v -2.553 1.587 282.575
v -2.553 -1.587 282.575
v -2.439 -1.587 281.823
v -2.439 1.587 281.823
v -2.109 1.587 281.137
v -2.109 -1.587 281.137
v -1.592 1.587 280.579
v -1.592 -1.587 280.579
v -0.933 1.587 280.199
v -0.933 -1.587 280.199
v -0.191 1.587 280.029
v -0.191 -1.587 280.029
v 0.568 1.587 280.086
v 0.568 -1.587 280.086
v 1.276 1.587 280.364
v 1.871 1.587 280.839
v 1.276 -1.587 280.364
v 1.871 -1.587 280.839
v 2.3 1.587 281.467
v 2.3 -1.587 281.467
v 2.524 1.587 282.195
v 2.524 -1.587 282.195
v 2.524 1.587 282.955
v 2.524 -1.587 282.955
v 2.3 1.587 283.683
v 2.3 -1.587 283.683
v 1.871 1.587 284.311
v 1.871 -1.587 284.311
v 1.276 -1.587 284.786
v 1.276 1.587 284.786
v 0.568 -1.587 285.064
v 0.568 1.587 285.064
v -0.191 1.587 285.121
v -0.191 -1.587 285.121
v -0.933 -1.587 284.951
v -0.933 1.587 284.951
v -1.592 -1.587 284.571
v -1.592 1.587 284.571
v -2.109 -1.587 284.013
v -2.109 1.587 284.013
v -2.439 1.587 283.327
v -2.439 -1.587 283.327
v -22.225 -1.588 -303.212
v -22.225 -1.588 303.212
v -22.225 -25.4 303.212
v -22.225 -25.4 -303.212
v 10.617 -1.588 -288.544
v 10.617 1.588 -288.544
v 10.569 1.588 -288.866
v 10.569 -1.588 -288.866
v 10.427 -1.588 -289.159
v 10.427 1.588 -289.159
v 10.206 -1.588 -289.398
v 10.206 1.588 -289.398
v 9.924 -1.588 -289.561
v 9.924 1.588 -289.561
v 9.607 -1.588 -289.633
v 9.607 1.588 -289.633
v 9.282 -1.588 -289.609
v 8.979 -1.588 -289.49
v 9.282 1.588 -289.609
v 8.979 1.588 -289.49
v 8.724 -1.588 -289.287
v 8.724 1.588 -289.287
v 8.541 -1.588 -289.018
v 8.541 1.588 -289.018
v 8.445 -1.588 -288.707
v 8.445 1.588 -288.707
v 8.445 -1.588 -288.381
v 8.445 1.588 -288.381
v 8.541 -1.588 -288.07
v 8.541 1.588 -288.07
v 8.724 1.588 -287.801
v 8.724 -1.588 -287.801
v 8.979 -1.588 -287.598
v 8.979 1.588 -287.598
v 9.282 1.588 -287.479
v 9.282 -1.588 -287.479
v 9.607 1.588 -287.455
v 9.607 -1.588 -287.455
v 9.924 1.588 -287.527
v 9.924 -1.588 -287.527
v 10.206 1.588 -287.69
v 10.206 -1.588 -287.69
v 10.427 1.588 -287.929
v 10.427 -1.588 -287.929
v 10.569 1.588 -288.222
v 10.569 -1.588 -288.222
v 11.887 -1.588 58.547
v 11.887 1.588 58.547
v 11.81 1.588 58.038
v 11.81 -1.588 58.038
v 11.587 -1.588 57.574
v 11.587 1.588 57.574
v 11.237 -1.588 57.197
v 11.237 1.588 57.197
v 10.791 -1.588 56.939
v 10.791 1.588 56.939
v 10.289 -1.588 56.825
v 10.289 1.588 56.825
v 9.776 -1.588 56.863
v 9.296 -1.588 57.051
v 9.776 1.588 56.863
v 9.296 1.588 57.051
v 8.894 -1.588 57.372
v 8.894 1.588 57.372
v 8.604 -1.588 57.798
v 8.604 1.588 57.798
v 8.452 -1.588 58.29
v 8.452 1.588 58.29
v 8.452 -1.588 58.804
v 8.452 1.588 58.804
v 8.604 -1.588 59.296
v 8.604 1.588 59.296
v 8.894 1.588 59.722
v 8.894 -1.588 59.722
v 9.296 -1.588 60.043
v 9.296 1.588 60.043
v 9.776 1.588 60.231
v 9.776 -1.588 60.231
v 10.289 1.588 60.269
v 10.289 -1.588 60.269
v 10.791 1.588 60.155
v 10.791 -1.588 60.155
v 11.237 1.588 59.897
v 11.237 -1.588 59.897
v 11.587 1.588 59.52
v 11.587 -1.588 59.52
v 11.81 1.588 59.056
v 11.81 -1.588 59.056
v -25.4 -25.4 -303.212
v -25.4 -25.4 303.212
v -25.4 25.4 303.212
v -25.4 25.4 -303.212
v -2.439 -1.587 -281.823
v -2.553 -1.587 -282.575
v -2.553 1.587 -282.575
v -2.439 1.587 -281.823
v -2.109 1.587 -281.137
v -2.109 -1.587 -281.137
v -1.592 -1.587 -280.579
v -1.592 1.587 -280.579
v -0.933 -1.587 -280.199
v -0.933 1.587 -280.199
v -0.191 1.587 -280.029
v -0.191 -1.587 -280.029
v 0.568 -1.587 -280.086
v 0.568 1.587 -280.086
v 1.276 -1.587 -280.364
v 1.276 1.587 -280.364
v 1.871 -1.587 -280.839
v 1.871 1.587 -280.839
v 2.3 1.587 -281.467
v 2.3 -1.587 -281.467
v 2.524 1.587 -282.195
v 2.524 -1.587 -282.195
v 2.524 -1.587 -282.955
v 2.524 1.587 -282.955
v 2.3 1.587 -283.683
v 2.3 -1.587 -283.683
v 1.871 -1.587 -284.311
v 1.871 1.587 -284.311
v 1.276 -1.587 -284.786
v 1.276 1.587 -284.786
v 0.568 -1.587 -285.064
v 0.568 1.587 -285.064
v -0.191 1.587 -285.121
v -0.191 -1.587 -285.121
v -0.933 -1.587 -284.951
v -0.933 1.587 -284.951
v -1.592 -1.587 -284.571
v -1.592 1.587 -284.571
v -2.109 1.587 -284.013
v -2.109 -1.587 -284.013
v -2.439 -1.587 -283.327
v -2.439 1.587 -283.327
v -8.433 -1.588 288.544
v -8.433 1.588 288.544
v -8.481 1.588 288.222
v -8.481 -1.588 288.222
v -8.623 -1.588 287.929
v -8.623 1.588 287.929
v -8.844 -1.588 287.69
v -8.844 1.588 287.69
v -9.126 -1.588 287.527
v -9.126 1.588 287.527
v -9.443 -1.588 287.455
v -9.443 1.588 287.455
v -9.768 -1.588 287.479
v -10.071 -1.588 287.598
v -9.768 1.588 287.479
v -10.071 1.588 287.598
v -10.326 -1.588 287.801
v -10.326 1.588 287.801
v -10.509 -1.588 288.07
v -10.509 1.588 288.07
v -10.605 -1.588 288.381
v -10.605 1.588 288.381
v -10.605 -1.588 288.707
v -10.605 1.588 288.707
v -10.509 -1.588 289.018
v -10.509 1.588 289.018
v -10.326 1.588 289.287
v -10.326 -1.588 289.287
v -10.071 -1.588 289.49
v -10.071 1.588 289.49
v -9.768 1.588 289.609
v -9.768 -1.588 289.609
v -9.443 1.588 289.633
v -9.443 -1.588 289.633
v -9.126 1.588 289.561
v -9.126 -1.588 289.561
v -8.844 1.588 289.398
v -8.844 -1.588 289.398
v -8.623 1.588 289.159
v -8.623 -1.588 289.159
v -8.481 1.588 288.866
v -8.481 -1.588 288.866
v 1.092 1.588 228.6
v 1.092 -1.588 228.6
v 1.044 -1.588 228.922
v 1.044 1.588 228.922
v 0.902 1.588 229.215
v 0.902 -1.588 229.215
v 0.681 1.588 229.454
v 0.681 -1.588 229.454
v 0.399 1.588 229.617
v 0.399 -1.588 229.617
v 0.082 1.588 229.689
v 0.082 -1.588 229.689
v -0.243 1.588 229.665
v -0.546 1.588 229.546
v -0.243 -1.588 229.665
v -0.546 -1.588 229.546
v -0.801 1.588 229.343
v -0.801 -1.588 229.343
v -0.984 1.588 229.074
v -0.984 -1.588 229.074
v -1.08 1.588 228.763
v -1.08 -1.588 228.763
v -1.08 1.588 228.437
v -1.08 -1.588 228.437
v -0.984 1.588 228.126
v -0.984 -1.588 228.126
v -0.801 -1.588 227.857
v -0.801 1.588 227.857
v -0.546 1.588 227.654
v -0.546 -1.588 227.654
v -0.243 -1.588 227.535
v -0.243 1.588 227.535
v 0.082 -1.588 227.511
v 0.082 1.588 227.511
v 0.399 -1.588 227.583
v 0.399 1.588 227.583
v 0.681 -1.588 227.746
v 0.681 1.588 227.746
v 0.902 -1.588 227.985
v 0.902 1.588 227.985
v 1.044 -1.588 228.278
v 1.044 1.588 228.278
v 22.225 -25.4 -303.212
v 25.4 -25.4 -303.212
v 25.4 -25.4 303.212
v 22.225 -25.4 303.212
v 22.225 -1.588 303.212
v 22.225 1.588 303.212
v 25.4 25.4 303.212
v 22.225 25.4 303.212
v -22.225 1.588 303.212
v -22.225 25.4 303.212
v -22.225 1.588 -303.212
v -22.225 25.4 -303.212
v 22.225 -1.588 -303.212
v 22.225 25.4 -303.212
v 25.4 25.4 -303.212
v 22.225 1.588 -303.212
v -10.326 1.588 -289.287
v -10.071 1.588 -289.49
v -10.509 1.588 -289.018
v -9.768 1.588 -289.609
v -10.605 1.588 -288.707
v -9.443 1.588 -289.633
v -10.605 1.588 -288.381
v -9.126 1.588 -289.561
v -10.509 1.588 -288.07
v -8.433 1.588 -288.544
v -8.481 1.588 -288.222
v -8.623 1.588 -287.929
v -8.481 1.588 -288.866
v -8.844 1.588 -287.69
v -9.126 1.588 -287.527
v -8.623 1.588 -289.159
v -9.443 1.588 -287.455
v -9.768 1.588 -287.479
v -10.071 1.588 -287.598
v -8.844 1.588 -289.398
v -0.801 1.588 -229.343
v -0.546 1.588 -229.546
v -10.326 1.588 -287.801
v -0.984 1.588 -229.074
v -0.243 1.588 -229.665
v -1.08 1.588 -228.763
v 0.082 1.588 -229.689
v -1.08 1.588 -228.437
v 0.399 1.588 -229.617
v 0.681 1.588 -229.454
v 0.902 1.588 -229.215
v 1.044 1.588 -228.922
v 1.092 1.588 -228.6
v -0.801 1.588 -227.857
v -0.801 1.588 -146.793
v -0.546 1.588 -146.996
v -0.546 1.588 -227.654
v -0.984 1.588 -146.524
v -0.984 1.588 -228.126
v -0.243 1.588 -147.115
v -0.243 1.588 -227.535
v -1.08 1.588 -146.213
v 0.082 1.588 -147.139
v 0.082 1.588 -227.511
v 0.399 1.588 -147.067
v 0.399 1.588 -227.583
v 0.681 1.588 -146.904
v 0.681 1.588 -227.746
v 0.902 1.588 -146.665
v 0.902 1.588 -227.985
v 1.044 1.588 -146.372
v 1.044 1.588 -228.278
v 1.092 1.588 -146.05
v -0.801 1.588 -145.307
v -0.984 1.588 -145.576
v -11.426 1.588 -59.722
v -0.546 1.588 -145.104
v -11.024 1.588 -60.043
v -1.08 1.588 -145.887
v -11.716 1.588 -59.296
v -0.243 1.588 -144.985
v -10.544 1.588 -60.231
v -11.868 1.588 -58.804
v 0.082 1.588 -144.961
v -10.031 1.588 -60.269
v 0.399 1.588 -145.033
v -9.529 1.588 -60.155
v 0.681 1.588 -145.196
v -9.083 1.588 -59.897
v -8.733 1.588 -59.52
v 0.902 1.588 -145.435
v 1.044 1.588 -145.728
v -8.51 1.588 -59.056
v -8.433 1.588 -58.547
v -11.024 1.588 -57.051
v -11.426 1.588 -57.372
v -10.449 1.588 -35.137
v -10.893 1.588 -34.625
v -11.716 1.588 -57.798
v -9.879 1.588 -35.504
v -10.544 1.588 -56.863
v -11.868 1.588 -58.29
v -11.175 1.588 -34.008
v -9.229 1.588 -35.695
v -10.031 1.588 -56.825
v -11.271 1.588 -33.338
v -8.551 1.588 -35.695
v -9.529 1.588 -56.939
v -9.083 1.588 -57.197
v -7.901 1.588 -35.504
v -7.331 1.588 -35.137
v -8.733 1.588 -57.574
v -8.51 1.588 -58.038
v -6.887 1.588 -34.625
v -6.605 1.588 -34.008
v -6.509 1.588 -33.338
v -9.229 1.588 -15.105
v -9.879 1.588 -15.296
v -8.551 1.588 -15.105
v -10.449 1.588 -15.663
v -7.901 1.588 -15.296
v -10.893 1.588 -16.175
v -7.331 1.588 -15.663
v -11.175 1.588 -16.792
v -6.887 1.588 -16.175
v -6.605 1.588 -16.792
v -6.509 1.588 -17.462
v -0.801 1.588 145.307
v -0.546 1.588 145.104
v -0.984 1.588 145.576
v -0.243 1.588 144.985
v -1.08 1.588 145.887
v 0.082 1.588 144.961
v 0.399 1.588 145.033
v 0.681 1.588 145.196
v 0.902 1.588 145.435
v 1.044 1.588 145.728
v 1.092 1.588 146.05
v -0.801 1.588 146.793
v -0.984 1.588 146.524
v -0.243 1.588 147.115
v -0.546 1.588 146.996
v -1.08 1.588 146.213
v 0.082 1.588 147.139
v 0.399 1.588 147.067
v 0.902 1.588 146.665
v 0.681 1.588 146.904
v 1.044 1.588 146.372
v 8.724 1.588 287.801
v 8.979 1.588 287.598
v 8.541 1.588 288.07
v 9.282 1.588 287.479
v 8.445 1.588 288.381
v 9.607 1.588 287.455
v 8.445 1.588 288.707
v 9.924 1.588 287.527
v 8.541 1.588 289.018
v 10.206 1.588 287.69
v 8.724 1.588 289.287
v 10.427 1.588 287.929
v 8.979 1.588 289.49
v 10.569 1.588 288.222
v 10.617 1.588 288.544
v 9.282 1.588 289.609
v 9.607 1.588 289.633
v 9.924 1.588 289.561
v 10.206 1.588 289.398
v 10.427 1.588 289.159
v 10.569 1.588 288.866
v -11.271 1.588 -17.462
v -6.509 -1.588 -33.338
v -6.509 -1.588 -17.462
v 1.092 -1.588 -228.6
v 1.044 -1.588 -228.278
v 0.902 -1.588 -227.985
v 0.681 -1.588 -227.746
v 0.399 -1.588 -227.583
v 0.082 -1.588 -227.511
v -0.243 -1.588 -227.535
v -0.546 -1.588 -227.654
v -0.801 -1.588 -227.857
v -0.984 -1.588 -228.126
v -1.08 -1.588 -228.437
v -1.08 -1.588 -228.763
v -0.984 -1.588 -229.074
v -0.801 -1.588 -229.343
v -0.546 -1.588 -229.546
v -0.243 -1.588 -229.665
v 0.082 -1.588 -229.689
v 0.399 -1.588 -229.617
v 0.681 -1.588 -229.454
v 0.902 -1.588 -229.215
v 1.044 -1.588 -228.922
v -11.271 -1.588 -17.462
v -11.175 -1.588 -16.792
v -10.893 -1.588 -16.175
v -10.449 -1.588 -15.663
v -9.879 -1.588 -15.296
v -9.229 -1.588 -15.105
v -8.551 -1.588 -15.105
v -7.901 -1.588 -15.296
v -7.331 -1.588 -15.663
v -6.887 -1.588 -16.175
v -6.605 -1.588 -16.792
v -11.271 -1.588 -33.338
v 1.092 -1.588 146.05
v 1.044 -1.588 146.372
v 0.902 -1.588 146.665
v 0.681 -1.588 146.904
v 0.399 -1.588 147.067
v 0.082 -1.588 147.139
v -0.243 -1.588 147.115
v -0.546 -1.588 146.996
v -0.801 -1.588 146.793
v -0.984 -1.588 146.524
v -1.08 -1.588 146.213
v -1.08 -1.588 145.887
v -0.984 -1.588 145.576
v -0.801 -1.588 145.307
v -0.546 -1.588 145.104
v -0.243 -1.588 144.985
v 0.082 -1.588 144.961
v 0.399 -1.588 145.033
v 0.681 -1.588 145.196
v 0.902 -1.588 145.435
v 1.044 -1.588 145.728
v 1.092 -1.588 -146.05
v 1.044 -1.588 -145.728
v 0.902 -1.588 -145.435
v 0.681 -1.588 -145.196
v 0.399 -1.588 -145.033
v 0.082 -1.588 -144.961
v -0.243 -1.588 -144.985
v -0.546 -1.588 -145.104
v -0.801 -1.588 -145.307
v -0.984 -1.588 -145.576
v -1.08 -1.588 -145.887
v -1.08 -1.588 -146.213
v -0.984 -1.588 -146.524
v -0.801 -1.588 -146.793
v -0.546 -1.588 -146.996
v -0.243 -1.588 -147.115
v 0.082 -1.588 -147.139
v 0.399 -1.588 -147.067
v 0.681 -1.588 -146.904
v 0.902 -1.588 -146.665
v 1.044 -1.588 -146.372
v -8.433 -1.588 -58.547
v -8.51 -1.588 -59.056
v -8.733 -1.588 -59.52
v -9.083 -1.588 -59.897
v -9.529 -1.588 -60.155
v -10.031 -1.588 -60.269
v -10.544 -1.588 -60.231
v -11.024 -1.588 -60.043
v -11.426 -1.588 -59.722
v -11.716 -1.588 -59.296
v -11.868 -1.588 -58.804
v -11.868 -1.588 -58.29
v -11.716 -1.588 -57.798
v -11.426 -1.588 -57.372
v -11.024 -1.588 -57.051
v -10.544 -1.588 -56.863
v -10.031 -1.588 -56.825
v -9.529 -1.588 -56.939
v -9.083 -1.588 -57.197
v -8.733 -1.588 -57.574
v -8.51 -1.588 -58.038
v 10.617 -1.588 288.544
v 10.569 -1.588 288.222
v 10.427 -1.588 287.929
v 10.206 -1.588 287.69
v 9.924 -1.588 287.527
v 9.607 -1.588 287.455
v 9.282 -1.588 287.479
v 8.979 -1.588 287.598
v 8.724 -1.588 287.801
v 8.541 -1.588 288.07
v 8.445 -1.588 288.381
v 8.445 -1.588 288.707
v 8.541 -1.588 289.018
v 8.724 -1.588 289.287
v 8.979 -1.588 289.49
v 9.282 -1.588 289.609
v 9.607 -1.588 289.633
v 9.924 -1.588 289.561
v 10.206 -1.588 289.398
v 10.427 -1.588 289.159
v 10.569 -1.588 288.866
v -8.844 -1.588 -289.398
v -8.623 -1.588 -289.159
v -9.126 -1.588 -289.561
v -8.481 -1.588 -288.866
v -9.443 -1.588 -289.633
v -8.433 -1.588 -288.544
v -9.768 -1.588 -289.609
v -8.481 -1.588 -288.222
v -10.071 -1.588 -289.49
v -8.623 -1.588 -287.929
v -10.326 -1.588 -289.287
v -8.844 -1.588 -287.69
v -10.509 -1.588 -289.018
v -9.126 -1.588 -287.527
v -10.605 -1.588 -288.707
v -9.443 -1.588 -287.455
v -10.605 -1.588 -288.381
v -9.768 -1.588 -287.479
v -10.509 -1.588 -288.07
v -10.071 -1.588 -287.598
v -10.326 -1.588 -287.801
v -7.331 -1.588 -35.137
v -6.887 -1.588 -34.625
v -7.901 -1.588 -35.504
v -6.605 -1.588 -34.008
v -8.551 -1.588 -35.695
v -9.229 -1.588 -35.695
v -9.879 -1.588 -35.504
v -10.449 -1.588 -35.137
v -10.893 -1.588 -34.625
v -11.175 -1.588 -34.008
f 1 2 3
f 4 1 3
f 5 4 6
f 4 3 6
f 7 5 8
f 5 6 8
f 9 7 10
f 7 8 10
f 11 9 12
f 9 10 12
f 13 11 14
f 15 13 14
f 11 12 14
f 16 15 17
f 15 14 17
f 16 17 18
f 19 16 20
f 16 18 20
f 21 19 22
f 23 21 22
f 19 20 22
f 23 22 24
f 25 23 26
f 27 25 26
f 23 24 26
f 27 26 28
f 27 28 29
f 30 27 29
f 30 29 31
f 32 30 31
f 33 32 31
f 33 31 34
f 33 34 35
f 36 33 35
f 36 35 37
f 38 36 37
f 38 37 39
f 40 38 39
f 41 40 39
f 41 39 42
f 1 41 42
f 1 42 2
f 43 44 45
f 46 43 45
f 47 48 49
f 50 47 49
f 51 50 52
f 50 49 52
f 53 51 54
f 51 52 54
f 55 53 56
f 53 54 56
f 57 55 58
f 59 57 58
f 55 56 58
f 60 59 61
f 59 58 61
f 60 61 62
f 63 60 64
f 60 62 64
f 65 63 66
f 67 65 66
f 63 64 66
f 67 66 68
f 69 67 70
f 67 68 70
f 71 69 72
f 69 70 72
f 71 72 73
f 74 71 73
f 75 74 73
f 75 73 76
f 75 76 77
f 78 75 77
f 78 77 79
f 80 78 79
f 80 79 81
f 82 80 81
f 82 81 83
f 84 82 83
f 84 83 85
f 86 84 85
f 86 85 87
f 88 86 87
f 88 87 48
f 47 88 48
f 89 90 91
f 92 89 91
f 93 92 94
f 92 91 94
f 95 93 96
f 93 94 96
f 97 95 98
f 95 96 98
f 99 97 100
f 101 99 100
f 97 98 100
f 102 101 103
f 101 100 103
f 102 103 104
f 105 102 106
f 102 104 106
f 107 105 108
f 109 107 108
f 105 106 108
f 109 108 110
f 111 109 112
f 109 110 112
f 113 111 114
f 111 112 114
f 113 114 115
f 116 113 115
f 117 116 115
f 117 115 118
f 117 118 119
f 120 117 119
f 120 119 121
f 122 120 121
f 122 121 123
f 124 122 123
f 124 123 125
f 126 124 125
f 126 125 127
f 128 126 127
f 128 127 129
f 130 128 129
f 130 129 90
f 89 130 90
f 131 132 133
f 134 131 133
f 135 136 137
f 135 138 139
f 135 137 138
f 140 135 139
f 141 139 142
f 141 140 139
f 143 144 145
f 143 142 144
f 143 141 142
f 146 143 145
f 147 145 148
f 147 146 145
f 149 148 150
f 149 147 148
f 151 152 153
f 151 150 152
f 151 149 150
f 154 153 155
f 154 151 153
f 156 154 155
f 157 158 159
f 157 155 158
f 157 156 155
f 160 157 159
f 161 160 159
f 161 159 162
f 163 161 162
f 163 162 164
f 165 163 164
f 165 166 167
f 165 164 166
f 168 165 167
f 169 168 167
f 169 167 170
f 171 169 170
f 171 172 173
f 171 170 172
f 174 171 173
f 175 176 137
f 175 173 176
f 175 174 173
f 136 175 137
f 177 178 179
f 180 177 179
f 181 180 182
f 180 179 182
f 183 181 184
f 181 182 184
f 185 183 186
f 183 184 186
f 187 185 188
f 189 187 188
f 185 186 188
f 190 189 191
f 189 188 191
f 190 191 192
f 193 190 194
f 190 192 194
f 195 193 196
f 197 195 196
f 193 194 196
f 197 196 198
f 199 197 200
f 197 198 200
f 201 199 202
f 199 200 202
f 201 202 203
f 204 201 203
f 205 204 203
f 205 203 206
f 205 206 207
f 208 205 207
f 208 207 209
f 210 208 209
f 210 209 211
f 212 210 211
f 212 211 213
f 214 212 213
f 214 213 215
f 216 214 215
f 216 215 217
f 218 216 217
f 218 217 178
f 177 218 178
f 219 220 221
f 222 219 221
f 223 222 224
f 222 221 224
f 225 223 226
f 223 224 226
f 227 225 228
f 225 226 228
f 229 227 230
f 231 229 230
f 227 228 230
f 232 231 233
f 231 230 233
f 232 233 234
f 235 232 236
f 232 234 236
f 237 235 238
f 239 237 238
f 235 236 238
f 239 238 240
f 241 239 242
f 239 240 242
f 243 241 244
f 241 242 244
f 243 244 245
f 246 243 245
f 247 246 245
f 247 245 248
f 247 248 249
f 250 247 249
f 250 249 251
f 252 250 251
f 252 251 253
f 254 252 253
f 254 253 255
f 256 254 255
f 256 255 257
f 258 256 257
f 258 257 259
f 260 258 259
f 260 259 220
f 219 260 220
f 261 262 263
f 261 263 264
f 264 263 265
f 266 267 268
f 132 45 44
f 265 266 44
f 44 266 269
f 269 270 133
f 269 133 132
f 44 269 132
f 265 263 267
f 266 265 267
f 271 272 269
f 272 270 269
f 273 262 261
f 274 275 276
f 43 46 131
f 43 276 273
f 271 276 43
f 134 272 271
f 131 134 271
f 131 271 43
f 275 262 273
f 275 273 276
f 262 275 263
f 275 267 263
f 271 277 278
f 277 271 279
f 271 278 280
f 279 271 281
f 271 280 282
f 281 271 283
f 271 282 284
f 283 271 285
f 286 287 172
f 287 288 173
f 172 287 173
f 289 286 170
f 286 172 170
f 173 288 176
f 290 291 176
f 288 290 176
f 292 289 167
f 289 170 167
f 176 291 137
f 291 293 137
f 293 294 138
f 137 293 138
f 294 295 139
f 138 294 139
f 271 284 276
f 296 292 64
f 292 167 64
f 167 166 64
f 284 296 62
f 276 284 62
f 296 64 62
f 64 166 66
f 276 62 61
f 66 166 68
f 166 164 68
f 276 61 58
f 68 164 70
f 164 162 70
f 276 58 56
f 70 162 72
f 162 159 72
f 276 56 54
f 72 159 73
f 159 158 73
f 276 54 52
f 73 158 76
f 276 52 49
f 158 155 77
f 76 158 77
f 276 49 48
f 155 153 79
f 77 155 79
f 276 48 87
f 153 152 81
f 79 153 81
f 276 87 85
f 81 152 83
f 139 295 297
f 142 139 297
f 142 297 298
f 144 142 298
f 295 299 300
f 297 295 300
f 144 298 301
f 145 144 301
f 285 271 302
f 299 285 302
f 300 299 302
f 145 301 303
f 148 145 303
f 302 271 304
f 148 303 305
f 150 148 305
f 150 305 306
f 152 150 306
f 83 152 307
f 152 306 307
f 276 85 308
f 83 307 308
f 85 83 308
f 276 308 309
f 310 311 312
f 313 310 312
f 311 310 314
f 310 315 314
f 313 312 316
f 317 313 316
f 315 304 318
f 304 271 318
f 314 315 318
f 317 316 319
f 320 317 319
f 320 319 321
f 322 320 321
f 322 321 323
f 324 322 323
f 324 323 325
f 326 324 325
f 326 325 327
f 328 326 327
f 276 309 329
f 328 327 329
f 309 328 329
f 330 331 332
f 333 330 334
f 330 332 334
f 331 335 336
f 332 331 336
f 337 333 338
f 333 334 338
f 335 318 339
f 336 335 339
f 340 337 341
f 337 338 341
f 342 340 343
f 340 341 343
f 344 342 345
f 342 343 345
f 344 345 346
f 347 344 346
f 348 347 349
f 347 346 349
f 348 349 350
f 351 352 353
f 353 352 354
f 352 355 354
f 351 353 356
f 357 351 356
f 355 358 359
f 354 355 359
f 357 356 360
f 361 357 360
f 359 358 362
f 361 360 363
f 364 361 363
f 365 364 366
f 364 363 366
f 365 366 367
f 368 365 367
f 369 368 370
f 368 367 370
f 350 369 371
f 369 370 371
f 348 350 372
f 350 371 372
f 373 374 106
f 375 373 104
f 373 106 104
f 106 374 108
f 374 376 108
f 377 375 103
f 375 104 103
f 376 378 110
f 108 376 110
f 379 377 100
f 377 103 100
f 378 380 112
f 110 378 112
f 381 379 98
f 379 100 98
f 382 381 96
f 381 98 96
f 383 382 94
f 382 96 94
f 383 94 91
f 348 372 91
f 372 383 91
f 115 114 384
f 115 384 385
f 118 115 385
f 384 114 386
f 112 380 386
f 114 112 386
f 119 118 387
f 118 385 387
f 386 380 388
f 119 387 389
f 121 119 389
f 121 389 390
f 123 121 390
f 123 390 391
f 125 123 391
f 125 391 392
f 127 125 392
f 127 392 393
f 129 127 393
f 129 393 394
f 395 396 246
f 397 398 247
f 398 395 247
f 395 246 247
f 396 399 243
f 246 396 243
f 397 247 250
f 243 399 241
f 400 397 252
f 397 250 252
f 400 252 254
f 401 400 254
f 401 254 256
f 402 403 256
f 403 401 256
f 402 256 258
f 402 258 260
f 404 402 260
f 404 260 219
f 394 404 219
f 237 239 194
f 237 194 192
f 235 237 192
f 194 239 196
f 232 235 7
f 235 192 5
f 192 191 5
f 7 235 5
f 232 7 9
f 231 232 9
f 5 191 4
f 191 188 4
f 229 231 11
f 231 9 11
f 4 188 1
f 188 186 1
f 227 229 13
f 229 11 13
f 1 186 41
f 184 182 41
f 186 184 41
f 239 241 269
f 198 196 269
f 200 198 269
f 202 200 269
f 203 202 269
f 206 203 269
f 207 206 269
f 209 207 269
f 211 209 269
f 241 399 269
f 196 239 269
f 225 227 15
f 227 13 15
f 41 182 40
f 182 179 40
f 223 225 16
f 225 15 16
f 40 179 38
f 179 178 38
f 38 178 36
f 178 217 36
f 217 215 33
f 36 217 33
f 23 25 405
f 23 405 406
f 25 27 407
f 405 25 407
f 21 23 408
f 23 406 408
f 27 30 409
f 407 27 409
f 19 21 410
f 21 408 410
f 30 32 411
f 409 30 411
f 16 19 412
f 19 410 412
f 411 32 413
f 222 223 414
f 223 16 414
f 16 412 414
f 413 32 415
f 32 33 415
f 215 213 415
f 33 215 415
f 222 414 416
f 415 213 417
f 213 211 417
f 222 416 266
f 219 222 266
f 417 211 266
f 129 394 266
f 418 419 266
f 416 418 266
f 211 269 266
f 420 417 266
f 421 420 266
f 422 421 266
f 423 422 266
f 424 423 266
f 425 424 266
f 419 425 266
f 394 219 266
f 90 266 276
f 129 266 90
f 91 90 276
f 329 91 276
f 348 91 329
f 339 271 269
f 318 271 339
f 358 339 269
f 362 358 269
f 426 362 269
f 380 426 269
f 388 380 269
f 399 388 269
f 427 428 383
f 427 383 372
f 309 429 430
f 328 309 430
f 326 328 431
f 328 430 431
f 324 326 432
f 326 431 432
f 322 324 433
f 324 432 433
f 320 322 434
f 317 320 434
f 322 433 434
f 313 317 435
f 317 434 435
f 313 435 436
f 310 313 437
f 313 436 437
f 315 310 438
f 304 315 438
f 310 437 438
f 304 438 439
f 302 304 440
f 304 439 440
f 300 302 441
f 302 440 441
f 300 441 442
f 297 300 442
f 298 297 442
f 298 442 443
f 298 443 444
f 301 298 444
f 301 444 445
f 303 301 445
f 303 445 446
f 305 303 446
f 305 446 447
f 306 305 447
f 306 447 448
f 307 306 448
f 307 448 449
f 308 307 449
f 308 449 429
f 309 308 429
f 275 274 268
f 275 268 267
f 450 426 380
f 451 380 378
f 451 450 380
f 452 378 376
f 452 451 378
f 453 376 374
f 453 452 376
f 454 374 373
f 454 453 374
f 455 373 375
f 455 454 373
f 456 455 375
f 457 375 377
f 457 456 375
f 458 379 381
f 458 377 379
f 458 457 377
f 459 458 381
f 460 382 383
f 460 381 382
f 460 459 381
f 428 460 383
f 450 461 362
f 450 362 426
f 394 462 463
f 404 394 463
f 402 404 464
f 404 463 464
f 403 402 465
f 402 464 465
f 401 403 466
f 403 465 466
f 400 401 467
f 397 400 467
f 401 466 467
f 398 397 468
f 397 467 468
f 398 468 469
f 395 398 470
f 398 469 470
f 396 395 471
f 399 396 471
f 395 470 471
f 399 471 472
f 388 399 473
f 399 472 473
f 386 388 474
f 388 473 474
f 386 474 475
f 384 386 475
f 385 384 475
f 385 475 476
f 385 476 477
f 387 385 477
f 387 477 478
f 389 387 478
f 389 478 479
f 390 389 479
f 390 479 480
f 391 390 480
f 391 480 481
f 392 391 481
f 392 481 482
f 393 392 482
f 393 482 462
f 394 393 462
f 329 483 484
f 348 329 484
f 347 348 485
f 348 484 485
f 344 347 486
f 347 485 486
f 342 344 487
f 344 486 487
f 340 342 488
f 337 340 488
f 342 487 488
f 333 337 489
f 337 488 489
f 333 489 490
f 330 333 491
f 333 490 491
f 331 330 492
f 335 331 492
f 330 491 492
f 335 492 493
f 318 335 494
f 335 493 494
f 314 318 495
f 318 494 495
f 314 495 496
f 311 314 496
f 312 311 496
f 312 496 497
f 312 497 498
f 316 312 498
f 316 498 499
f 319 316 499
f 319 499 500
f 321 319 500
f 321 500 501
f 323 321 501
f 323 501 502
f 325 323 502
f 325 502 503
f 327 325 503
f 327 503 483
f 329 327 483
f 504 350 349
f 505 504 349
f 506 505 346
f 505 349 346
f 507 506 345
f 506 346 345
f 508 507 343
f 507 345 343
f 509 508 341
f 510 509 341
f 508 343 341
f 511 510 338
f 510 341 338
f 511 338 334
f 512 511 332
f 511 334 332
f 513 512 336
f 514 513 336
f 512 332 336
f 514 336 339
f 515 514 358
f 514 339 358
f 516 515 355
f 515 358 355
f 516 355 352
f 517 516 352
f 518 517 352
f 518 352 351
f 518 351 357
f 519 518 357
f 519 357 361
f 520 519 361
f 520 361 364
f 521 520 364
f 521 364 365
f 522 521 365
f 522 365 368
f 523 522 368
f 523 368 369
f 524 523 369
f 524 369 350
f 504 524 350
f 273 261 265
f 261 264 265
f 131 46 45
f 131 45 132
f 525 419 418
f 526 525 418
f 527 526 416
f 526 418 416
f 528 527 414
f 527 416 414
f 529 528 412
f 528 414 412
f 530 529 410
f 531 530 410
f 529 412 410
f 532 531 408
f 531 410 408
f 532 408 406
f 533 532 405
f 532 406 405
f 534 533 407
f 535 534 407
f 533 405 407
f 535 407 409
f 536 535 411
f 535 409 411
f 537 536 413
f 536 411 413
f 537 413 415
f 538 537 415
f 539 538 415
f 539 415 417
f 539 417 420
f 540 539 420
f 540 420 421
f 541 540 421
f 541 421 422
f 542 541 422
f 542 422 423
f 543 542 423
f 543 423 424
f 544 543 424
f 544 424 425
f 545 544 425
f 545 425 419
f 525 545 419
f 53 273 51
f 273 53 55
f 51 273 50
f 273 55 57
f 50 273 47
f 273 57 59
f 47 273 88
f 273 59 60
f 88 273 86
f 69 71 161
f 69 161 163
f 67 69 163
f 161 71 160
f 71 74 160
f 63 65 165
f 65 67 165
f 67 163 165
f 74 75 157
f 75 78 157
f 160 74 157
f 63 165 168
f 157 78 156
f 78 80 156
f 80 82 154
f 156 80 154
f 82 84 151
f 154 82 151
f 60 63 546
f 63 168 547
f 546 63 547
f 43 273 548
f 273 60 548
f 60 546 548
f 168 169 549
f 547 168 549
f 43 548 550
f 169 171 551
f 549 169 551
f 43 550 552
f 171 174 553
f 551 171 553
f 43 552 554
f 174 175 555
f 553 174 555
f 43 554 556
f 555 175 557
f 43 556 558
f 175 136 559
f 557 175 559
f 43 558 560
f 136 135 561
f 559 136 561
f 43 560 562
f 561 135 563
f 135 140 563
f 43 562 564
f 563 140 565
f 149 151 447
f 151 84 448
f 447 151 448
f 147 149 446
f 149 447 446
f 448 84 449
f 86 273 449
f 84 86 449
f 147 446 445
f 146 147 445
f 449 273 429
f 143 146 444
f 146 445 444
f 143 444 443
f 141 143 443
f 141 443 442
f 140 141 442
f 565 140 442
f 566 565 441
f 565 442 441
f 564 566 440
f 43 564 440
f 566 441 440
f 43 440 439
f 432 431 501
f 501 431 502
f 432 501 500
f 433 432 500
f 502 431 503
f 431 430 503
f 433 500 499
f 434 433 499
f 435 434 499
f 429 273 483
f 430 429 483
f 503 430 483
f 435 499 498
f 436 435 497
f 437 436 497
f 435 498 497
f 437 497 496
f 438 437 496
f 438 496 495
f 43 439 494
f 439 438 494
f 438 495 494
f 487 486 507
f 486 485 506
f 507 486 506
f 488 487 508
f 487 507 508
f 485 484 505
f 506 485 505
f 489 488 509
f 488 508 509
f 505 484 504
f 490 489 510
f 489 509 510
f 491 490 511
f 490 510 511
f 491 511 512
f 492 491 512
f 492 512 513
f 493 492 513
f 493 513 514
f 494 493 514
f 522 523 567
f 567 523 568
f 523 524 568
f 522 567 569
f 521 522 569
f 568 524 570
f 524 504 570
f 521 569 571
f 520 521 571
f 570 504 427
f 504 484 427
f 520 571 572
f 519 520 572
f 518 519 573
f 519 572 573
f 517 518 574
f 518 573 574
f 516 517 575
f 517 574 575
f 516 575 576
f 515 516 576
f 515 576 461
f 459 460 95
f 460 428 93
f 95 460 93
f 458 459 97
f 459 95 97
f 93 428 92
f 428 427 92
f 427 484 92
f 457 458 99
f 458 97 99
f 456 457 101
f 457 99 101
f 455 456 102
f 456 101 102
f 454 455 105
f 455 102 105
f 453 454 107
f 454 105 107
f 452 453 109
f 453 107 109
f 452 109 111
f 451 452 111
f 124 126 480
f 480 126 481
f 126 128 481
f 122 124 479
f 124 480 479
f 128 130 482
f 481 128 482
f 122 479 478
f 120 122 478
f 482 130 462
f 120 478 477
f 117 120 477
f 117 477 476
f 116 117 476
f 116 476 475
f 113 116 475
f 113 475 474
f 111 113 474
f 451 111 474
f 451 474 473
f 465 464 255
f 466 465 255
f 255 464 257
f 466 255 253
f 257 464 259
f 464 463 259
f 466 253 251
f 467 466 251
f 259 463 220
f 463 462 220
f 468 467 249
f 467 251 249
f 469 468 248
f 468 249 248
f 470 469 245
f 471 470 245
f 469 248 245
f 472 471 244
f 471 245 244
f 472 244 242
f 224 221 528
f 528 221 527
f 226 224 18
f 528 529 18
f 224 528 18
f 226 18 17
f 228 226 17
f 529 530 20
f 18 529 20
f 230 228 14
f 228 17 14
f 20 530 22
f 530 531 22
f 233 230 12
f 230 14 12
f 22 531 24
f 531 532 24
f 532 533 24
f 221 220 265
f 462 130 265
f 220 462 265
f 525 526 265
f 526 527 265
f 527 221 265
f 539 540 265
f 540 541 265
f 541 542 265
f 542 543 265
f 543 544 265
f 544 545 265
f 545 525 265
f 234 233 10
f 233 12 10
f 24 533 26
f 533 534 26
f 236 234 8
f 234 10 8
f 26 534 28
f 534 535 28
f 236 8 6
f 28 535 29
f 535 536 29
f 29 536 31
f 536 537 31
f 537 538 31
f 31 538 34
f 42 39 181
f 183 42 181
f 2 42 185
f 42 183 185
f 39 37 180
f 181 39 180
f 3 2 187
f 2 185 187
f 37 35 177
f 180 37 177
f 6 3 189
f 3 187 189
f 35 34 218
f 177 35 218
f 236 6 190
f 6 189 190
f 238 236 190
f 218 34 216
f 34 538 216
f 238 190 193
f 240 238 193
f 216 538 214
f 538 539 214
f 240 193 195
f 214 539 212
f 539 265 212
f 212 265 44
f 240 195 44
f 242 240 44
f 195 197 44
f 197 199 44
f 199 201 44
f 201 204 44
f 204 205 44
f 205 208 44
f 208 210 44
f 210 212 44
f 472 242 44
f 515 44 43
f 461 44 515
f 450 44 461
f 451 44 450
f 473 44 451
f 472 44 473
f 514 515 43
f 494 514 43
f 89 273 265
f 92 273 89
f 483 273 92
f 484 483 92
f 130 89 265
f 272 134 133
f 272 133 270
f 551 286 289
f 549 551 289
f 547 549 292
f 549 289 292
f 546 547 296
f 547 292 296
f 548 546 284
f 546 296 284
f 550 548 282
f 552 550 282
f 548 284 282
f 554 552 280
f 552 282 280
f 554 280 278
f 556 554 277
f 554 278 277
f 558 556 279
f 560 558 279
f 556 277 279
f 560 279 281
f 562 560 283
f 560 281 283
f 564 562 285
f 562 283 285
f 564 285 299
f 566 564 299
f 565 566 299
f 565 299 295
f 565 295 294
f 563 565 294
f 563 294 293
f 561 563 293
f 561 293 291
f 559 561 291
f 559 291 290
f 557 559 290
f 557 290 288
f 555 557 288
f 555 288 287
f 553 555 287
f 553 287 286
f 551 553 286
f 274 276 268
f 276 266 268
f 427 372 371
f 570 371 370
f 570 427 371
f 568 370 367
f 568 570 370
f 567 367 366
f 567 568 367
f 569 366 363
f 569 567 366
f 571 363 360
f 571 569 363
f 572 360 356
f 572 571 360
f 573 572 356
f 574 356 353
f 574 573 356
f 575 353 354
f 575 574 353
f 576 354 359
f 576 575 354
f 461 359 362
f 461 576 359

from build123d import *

# Parameters (mm, degrees)
EXTRUSION_PROFILE_DEPTH                      = 303.2125
SKETCH3_R                                    = 1.7272
THRU_HOLES_FOR_DRIVER_ENCLOSURE_DEPTH        = 27.9875
WIRE_ROUTING_SLOT_DEPTH                      = 27.9875
SKETCH5_R                                    = 1.0922
F_4_40_TAPPED_HOLES_FOR_MAGNETIC_CATCH_DEPTH = 27.9875
F_1_4_20_TAPPED_HOLE_FOR_MOUNTING_BRACKET_D  = 5.1054
SKETCH9_R                                    = 1.0922
F_4_40_TAPPED_HOLES_FOR_LED_BOARD_DEPTH      = 27.9875


with BuildPart() as part:
    # Sketch1 → Extrusion Profile (new body, symmetric)
    with BuildSketch(Plane.XY):
        Polygon((-25.4, -25.4), (-25.4, 25.4), (-22.225, 25.4), (-22.225, 1.5875), (22.225, 1.5875), (22.225, 25.4), (25.4, 25.4), (25.4, -25.4), (22.225, -25.4), (22.225, -1.5875), (-22.225, -1.5875), (-22.225, -25.4), align=None)
    extrude(amount=EXTRUSION_PROFILE_DEPTH, both=True)

    # Sketch3 → Thru Holes for Driver Enclosure (cut, through all)
    with BuildSketch(Plane(origin=(0, 1.5875, 0), x_dir=(1, 0, 0), z_dir=(0, 1, 0))):
        with Locations((10.16, -58.547)):
            Circle(SKETCH3_R)
        with Locations((-10.16, 58.547)):
            Circle(SKETCH3_R)
    extrude(amount=-THRU_HOLES_FOR_DRIVER_ENCLOSURE_DEPTH, mode=Mode.SUBTRACT)

    # Sketch4 → Wire Routing Slot (cut, through all)
    with BuildSketch(Plane.XZ.offset(1.5875)):
        with BuildLine():
            Line((-11.27125, -33.3375), (-11.27125, -17.4625))
            ThreePointArc((-11.27125, -17.4625), (-8.89, -15.08125), (-6.50875, -17.4625))
            Line((-6.50875, -17.4625), (-6.50875, -33.3375))
            ThreePointArc((-6.50875, -33.3375), (-8.89, -35.71875), (-11.27125, -33.3375))
        make_face()
    extrude(amount=-WIRE_ROUTING_SLOT_DEPTH, mode=Mode.SUBTRACT)

    # Sketch5 → 4-40 Tapped Holes for Magnetic Catch (cut, through all)
    with BuildSketch(Plane(origin=(0, 1.5875, 0), x_dir=(1, 0, 0), z_dir=(0, 1, 0))):
        with Locations((-9.525, -288.544)):
            Circle(SKETCH5_R)
        with Locations((9.525, -288.544)):
            Circle(SKETCH5_R)
        with Locations((9.525, 288.544)):
            Circle(SKETCH5_R)
        with Locations((-9.525, 288.544)):
            Circle(SKETCH5_R)
    extrude(amount=-F_4_40_TAPPED_HOLES_FOR_MAGNETIC_CATCH_DEPTH, mode=Mode.SUBTRACT)

    # 1/4-20 Tapped Hole for Mounting Bracket (through all)
    with Locations(Plane(origin=(0, 1.5875, 0), x_dir=(1, 0, 0), z_dir=(0, 1, 0))):
        with Locations((0, -282.575)):
            f_1_4_20_tapped_hole_for_mounting_bracket = Hole(F_1_4_20_TAPPED_HOLE_FOR_MOUNTING_BRACKET_D / 2)

    # Mirror1: 1/4-20 Tapped Hole for Mounting Bracket across plane
    add(f_1_4_20_tapped_hole_for_mounting_bracket.mirror(Plane.XY), mode=Mode.SUBTRACT)

    # Sketch9 → 4-40 Tapped Holes for LED Board (cut, through all)
    with BuildSketch(Plane.XZ.offset(1.5875)):
        with Locations((0, -228.6)):
            Circle(SKETCH9_R)
        with Locations((0, -146.05)):
            Circle(SKETCH9_R)
        with Locations((0, 146.05)):
            Circle(SKETCH9_R)
        with Locations((0, 228.6)):
            Circle(SKETCH9_R)
    extrude(amount=-F_4_40_TAPPED_HOLES_FOR_LED_BOARD_DEPTH, mode=Mode.SUBTRACT)


solid = part.part
